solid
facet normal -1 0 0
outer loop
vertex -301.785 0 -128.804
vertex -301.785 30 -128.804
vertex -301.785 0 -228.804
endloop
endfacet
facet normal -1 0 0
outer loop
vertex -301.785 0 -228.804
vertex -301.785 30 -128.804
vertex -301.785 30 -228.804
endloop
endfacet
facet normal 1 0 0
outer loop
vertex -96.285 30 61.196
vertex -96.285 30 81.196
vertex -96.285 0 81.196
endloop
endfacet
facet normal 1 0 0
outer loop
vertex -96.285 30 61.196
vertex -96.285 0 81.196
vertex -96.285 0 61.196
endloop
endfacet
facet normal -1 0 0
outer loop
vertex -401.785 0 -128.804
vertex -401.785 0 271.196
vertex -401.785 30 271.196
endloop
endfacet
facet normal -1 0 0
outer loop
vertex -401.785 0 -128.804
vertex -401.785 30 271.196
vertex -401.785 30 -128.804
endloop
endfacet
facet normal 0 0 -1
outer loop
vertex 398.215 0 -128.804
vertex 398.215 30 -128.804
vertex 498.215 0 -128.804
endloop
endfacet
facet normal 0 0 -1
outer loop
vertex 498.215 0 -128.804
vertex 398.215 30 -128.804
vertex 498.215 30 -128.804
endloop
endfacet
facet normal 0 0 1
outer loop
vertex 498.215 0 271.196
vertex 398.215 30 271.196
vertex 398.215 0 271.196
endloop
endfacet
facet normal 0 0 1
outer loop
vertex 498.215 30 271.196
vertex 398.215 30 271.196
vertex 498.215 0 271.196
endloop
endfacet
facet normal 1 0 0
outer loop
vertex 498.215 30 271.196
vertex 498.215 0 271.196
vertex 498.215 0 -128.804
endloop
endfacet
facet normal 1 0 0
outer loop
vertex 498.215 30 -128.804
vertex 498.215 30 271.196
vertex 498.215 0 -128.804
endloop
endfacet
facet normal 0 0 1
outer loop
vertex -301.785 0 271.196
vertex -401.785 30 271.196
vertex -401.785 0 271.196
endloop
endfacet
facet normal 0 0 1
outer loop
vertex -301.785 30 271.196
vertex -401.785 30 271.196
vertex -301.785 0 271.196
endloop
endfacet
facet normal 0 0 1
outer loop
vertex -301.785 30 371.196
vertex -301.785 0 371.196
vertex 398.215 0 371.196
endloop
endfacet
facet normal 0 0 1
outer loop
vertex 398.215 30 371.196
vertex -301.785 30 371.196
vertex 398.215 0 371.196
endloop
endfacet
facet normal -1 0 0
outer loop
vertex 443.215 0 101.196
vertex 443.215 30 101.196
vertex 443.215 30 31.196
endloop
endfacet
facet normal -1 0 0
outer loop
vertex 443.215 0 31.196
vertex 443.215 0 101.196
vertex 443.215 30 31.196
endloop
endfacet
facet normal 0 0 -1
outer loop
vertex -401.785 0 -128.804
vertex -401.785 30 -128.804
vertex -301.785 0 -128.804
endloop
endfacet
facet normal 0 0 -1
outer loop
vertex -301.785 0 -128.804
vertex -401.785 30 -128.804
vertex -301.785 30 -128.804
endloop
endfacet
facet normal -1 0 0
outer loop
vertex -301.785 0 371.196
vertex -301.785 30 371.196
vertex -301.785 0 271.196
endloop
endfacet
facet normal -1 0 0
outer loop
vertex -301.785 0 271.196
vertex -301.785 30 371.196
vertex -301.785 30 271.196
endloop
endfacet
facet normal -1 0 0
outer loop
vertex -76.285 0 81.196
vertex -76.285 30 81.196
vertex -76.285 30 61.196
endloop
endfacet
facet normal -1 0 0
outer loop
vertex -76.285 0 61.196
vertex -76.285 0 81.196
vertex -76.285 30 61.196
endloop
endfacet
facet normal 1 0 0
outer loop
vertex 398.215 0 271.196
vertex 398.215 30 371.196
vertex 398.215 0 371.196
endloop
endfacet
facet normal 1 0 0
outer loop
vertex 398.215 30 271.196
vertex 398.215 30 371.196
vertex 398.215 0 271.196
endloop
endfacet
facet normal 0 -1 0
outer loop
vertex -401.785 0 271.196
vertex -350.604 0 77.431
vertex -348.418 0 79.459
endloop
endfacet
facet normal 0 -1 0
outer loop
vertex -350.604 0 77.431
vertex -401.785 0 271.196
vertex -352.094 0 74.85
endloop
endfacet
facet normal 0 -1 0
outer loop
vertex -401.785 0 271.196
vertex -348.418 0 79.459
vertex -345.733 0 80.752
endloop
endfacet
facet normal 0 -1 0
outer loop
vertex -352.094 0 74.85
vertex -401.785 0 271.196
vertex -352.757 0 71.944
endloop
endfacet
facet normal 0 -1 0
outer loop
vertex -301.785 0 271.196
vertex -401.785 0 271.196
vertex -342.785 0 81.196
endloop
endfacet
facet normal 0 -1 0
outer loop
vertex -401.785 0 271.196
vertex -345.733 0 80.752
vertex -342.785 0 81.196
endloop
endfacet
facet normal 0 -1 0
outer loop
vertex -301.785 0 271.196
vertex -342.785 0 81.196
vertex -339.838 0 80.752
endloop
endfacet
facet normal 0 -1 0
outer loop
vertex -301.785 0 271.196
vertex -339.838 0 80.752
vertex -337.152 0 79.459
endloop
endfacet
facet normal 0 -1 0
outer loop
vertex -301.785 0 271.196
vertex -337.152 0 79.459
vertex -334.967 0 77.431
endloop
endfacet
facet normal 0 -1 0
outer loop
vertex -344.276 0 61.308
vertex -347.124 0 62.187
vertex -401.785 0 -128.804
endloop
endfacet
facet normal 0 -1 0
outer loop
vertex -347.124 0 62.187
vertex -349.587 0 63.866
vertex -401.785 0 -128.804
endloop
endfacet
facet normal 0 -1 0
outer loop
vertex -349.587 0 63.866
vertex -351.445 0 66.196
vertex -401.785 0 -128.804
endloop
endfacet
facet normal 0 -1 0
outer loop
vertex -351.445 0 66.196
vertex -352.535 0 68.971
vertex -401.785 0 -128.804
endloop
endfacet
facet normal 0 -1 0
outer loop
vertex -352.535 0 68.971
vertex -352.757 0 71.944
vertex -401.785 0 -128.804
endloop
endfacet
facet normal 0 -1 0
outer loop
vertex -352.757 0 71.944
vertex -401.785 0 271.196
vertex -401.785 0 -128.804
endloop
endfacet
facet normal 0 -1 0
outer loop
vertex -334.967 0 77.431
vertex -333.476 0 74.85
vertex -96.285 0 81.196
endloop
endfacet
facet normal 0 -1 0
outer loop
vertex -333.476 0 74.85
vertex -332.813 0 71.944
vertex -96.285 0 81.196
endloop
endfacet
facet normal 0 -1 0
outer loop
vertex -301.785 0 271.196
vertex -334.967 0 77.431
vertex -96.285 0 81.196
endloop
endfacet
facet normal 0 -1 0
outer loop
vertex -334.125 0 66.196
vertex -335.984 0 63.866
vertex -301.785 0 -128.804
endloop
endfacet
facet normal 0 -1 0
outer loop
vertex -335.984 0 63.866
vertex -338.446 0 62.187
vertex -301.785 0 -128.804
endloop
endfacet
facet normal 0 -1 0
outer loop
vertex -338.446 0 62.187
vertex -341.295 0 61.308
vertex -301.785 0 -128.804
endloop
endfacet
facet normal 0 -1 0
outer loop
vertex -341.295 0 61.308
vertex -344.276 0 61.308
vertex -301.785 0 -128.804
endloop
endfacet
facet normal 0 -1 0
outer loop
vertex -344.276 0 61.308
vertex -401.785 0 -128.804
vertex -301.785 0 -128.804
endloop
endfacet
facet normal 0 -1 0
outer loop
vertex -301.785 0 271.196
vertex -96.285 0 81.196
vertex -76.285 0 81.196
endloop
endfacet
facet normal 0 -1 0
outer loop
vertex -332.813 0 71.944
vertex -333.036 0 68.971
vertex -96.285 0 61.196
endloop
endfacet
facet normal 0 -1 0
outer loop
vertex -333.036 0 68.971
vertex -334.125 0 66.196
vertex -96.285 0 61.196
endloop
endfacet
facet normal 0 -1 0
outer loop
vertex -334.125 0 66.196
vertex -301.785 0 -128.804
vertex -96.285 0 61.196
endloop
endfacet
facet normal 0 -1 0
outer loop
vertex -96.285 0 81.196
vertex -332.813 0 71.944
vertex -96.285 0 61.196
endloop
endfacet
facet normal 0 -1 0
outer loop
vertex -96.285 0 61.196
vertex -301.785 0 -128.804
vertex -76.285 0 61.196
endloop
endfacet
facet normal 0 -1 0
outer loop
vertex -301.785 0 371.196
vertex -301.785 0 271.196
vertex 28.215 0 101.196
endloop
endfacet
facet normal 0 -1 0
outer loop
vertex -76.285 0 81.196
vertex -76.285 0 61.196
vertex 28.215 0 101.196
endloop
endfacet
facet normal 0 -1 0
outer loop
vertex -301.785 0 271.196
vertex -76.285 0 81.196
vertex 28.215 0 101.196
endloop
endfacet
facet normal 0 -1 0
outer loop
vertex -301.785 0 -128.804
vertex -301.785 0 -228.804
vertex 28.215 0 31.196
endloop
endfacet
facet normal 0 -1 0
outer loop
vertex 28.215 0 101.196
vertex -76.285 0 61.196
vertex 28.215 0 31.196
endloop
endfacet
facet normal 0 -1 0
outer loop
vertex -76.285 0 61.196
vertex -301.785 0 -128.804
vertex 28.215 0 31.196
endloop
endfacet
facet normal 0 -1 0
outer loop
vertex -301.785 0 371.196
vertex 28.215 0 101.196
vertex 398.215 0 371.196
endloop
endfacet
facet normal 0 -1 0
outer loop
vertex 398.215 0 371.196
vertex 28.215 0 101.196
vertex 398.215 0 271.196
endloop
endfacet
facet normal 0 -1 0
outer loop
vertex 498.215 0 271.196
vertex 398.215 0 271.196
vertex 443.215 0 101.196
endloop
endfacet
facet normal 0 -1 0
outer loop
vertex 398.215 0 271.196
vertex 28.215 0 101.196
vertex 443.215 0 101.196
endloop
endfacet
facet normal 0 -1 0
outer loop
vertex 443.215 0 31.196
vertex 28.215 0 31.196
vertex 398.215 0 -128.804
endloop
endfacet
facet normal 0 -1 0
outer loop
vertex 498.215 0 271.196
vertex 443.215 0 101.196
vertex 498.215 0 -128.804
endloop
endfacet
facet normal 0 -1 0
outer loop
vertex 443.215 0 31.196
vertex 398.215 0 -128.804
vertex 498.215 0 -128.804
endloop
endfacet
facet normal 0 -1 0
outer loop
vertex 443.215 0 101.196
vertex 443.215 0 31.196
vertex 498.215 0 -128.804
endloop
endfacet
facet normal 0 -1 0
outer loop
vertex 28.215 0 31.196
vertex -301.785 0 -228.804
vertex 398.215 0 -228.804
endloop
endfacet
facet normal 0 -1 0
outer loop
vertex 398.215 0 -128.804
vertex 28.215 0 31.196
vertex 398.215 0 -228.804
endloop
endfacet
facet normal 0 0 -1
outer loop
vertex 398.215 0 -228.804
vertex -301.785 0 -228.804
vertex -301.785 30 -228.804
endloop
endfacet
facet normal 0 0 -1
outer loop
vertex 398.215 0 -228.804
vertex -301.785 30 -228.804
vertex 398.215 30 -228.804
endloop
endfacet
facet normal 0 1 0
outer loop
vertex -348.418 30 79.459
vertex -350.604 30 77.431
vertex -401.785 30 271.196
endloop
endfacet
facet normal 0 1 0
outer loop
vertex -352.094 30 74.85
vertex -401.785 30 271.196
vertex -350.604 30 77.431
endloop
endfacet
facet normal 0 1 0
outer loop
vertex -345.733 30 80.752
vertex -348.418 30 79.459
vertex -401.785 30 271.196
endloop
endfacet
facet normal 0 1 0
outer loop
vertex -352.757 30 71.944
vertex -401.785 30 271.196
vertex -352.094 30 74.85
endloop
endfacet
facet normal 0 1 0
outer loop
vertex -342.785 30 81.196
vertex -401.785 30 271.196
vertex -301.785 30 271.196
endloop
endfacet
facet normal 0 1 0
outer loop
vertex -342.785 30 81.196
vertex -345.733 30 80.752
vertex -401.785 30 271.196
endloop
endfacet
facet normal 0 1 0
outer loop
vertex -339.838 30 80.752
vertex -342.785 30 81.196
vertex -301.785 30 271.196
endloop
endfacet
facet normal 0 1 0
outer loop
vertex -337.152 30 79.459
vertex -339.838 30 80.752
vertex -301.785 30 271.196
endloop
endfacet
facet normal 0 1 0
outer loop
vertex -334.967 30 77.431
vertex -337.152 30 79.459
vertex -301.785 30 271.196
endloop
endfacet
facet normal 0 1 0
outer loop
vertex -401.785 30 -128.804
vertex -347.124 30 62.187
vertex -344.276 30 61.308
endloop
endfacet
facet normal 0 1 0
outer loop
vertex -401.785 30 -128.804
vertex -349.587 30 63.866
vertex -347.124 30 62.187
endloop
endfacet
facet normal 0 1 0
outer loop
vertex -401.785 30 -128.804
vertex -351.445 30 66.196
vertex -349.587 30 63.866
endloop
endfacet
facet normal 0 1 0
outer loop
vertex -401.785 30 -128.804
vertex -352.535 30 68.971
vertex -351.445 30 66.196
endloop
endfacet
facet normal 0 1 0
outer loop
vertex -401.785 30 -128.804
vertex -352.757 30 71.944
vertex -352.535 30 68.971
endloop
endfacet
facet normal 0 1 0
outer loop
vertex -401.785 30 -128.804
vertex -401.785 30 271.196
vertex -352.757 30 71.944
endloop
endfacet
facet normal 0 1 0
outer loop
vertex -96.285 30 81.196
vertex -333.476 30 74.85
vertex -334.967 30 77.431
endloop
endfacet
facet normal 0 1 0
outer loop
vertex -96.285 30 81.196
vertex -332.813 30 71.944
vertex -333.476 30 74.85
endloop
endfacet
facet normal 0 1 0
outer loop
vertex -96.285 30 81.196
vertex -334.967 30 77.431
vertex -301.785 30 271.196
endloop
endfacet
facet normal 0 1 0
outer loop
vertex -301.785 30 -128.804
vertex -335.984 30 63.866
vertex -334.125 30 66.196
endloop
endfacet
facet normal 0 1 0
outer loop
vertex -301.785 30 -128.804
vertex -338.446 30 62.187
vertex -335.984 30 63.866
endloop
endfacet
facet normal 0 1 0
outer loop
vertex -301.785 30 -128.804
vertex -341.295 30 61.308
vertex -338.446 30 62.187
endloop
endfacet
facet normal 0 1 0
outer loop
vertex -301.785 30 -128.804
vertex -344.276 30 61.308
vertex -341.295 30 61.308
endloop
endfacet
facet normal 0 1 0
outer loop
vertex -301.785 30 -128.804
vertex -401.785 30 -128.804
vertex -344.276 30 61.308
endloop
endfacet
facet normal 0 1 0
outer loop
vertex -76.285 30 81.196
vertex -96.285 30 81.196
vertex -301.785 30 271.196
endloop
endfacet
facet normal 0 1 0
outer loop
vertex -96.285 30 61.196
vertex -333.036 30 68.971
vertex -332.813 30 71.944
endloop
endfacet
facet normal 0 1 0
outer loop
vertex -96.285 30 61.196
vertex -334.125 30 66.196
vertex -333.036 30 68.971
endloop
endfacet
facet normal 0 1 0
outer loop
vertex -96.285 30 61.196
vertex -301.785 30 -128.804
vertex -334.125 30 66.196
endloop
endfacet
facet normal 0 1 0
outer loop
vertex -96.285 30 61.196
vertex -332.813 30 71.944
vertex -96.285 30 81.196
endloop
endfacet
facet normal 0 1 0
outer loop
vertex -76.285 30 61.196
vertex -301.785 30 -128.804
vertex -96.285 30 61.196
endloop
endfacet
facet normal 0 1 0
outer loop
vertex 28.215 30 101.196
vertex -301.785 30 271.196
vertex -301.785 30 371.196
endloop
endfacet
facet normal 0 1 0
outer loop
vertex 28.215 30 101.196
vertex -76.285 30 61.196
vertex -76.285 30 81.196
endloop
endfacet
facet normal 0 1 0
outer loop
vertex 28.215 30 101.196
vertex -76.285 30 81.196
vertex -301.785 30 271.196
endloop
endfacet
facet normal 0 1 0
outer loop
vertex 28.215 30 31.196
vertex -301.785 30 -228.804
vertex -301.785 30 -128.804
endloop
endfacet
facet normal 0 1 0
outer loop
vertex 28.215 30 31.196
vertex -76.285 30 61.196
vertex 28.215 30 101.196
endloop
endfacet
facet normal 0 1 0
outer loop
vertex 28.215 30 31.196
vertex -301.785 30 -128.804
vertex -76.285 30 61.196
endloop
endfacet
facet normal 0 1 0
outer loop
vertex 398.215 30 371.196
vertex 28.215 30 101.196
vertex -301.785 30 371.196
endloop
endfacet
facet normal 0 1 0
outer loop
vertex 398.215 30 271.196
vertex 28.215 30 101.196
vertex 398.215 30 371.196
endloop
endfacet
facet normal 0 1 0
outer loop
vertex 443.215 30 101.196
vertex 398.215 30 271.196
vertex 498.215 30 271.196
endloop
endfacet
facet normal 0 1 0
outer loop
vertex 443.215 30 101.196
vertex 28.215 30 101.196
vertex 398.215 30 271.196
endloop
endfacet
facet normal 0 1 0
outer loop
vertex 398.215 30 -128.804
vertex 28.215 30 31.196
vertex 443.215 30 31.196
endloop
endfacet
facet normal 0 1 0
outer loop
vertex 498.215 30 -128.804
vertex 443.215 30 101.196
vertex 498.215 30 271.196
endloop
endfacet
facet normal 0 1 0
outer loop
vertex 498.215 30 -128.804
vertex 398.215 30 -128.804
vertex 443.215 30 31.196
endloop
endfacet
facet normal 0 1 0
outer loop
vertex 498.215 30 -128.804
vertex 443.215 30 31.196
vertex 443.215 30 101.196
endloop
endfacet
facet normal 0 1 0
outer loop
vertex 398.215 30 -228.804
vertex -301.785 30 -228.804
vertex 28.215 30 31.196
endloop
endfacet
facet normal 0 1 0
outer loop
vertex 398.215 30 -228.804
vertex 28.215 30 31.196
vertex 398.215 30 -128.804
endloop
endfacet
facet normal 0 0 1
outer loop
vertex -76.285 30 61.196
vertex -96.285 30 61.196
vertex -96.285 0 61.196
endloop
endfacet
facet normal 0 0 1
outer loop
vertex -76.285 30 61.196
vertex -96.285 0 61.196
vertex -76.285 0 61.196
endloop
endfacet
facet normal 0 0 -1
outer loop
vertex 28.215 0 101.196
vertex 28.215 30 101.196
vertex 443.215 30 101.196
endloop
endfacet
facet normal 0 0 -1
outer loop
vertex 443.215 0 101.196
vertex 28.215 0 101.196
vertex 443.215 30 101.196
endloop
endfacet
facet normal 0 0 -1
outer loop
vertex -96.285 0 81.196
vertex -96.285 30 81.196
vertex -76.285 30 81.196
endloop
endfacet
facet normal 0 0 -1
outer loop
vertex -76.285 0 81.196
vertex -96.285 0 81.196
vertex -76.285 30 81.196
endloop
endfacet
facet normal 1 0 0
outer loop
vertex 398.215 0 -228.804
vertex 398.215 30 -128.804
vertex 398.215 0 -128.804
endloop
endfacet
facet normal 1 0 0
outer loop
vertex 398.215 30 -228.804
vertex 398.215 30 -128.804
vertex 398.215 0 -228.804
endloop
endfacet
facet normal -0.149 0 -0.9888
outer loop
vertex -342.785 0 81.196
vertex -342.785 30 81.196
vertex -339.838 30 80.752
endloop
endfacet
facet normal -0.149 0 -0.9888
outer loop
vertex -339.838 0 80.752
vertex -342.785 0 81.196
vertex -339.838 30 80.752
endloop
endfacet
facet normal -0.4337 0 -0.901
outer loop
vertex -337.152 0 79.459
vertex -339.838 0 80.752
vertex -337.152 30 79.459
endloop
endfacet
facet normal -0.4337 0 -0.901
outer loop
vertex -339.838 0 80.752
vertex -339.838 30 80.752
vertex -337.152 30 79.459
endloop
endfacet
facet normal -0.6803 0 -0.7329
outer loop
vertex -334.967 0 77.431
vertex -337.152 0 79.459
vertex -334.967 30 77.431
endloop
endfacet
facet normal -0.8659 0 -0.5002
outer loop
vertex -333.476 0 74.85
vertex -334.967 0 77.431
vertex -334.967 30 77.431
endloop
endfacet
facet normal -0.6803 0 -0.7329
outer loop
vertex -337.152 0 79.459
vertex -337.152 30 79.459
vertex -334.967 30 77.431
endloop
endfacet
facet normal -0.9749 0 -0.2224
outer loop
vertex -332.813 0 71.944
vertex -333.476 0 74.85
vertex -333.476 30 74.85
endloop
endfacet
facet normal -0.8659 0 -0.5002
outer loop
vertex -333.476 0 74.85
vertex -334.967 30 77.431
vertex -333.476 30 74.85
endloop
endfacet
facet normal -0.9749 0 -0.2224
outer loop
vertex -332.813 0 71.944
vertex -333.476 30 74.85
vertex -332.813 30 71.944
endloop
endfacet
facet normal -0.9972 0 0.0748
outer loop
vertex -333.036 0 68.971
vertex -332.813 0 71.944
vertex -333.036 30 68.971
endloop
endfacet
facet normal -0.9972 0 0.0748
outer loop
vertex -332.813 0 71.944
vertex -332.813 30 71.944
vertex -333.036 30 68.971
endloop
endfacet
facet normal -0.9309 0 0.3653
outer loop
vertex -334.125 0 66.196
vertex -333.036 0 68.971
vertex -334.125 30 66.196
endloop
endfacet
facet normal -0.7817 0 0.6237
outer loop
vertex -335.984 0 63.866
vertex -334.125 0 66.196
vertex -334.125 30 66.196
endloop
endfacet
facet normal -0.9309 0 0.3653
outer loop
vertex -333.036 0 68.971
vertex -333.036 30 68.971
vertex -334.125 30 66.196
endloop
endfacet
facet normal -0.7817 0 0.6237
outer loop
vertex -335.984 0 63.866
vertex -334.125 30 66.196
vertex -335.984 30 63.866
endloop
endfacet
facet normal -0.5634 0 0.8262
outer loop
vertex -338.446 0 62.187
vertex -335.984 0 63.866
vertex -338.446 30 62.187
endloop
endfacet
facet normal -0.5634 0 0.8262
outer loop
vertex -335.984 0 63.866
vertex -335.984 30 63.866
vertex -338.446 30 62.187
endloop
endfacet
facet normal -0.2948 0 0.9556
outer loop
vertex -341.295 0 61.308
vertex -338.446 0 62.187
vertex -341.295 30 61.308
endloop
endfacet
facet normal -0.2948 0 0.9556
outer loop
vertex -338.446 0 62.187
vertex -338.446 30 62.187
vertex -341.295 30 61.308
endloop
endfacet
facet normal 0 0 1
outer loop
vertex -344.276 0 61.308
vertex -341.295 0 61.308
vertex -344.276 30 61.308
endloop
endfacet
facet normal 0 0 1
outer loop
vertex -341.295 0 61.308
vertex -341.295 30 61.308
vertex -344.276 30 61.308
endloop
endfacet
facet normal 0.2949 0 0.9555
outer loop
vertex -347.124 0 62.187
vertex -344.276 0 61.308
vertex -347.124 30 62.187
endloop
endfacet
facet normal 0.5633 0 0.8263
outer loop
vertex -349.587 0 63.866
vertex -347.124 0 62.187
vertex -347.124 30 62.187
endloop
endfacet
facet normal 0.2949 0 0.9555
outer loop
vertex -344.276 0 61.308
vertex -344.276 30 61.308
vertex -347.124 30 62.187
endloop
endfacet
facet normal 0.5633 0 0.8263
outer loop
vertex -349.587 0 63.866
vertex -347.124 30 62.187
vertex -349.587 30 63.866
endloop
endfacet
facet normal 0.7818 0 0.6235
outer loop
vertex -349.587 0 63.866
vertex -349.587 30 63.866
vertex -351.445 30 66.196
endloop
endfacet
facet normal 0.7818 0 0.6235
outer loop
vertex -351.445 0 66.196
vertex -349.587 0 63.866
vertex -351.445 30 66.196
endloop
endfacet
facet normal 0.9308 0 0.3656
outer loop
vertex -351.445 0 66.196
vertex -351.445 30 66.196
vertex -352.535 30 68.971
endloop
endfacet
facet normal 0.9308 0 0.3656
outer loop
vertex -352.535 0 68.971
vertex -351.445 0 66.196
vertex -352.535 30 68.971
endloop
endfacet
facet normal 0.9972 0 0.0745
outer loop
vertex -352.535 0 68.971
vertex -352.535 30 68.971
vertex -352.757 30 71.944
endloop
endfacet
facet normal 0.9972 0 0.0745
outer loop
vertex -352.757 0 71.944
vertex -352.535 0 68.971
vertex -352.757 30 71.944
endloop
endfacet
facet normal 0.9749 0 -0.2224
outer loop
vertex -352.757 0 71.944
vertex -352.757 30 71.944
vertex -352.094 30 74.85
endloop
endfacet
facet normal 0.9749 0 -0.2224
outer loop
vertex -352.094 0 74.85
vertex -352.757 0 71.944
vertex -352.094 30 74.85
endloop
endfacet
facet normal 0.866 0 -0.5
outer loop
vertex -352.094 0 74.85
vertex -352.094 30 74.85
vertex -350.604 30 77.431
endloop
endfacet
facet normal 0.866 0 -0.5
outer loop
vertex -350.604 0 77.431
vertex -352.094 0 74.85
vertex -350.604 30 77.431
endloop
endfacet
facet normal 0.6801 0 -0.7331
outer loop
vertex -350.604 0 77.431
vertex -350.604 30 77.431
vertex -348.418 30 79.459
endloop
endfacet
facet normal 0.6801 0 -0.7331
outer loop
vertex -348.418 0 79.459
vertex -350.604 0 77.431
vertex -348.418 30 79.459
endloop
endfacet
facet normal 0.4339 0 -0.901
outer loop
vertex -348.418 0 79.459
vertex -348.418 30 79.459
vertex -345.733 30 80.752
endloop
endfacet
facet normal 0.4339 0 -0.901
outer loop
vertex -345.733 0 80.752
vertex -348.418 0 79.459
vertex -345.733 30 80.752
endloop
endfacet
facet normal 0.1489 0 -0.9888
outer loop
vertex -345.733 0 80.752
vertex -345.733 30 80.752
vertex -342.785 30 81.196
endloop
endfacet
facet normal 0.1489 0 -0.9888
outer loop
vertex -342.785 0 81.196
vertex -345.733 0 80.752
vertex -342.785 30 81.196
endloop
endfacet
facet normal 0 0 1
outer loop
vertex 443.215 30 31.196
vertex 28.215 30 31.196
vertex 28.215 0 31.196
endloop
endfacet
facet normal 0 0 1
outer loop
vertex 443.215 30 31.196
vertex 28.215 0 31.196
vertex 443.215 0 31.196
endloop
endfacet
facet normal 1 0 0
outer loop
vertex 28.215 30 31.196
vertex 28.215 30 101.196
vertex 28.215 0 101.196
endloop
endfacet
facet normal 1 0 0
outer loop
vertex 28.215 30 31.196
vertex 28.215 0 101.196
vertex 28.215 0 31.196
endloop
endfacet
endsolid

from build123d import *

# Parameters (mm, degrees)
SKETCH1_W           = 900
SKETCH1_H           = 600
BOSS_EXTRUDE1_DEPTH = 30
SKETCH2_W           = 100
SKETCH2_H           = 100
CUT_EXTRUDE1_DEPTH  = 623.016629111
SKETCH4_R           = 10
SKETCH4_W           = 20
SKETCH4_H           = 20
CUT_EXTRUDE2_DEPTH  = 176
SKETCH5_W           = 415
SKETCH5_H           = 70
CUT_EXTRUDE3_DEPTH  = 110


with BuildPart() as part:
    # Sketch1 → Boss-Extrude1 (new body)
    with BuildSketch(Plane(origin=(0, 0, 0), x_dir=(1, 0, 0), z_dir=(0, 1, 0))):
        with Locations((48.214762953, -71.196358908)):
            Rectangle(SKETCH1_W, SKETCH1_H)
    extrude(amount=BOSS_EXTRUDE1_DEPTH)

    # Sketch2 → Cut-Extrude1 (cut, through all)
    with BuildSketch(Plane(origin=(0, 30, 0), x_dir=(1, 0, 0), z_dir=(0, 1, 0))):
        with Locations((-351.785237047, 178.803641092)):
            Rectangle(SKETCH2_W, SKETCH2_H)
        with Locations((-351.785237047, -321.196358908)):
            Rectangle(SKETCH2_W, SKETCH2_H)
        with Locations((448.214762953, -321.196358908)):
            Rectangle(SKETCH2_W, SKETCH2_H)
        with Locations((448.214762953, 178.803641092)):
            Rectangle(SKETCH2_W, SKETCH2_H)
    extrude(amount=-CUT_EXTRUDE1_DEPTH, mode=Mode.SUBTRACT)

    # Sketch4 → Cut-Extrude2 (cut)
    with BuildSketch(Plane(origin=(0, 30, 0), x_dir=(1, 0, 0), z_dir=(0, 1, 0))):
        with Locations(Location((-342.785237047, -71.196358908, 0), (0, 0, 270))):
            Circle(SKETCH4_R)
        with Locations((-86.285237047, -71.196358908)):
            Rectangle(SKETCH4_W, SKETCH4_H)
    extrude(amount=-CUT_EXTRUDE2_DEPTH, mode=Mode.SUBTRACT)

    # Sketch5 → Cut-Extrude3 (cut)
    with BuildSketch(Plane(origin=(0, 30, 0), x_dir=(1, 0, 0), z_dir=(0, 1, 0))):
        with Locations((235.714762953, -66.196358908)):
            Rectangle(SKETCH5_W, SKETCH5_H)
    extrude(amount=-CUT_EXTRUDE3_DEPTH, mode=Mode.SUBTRACT)


solid = part.part
